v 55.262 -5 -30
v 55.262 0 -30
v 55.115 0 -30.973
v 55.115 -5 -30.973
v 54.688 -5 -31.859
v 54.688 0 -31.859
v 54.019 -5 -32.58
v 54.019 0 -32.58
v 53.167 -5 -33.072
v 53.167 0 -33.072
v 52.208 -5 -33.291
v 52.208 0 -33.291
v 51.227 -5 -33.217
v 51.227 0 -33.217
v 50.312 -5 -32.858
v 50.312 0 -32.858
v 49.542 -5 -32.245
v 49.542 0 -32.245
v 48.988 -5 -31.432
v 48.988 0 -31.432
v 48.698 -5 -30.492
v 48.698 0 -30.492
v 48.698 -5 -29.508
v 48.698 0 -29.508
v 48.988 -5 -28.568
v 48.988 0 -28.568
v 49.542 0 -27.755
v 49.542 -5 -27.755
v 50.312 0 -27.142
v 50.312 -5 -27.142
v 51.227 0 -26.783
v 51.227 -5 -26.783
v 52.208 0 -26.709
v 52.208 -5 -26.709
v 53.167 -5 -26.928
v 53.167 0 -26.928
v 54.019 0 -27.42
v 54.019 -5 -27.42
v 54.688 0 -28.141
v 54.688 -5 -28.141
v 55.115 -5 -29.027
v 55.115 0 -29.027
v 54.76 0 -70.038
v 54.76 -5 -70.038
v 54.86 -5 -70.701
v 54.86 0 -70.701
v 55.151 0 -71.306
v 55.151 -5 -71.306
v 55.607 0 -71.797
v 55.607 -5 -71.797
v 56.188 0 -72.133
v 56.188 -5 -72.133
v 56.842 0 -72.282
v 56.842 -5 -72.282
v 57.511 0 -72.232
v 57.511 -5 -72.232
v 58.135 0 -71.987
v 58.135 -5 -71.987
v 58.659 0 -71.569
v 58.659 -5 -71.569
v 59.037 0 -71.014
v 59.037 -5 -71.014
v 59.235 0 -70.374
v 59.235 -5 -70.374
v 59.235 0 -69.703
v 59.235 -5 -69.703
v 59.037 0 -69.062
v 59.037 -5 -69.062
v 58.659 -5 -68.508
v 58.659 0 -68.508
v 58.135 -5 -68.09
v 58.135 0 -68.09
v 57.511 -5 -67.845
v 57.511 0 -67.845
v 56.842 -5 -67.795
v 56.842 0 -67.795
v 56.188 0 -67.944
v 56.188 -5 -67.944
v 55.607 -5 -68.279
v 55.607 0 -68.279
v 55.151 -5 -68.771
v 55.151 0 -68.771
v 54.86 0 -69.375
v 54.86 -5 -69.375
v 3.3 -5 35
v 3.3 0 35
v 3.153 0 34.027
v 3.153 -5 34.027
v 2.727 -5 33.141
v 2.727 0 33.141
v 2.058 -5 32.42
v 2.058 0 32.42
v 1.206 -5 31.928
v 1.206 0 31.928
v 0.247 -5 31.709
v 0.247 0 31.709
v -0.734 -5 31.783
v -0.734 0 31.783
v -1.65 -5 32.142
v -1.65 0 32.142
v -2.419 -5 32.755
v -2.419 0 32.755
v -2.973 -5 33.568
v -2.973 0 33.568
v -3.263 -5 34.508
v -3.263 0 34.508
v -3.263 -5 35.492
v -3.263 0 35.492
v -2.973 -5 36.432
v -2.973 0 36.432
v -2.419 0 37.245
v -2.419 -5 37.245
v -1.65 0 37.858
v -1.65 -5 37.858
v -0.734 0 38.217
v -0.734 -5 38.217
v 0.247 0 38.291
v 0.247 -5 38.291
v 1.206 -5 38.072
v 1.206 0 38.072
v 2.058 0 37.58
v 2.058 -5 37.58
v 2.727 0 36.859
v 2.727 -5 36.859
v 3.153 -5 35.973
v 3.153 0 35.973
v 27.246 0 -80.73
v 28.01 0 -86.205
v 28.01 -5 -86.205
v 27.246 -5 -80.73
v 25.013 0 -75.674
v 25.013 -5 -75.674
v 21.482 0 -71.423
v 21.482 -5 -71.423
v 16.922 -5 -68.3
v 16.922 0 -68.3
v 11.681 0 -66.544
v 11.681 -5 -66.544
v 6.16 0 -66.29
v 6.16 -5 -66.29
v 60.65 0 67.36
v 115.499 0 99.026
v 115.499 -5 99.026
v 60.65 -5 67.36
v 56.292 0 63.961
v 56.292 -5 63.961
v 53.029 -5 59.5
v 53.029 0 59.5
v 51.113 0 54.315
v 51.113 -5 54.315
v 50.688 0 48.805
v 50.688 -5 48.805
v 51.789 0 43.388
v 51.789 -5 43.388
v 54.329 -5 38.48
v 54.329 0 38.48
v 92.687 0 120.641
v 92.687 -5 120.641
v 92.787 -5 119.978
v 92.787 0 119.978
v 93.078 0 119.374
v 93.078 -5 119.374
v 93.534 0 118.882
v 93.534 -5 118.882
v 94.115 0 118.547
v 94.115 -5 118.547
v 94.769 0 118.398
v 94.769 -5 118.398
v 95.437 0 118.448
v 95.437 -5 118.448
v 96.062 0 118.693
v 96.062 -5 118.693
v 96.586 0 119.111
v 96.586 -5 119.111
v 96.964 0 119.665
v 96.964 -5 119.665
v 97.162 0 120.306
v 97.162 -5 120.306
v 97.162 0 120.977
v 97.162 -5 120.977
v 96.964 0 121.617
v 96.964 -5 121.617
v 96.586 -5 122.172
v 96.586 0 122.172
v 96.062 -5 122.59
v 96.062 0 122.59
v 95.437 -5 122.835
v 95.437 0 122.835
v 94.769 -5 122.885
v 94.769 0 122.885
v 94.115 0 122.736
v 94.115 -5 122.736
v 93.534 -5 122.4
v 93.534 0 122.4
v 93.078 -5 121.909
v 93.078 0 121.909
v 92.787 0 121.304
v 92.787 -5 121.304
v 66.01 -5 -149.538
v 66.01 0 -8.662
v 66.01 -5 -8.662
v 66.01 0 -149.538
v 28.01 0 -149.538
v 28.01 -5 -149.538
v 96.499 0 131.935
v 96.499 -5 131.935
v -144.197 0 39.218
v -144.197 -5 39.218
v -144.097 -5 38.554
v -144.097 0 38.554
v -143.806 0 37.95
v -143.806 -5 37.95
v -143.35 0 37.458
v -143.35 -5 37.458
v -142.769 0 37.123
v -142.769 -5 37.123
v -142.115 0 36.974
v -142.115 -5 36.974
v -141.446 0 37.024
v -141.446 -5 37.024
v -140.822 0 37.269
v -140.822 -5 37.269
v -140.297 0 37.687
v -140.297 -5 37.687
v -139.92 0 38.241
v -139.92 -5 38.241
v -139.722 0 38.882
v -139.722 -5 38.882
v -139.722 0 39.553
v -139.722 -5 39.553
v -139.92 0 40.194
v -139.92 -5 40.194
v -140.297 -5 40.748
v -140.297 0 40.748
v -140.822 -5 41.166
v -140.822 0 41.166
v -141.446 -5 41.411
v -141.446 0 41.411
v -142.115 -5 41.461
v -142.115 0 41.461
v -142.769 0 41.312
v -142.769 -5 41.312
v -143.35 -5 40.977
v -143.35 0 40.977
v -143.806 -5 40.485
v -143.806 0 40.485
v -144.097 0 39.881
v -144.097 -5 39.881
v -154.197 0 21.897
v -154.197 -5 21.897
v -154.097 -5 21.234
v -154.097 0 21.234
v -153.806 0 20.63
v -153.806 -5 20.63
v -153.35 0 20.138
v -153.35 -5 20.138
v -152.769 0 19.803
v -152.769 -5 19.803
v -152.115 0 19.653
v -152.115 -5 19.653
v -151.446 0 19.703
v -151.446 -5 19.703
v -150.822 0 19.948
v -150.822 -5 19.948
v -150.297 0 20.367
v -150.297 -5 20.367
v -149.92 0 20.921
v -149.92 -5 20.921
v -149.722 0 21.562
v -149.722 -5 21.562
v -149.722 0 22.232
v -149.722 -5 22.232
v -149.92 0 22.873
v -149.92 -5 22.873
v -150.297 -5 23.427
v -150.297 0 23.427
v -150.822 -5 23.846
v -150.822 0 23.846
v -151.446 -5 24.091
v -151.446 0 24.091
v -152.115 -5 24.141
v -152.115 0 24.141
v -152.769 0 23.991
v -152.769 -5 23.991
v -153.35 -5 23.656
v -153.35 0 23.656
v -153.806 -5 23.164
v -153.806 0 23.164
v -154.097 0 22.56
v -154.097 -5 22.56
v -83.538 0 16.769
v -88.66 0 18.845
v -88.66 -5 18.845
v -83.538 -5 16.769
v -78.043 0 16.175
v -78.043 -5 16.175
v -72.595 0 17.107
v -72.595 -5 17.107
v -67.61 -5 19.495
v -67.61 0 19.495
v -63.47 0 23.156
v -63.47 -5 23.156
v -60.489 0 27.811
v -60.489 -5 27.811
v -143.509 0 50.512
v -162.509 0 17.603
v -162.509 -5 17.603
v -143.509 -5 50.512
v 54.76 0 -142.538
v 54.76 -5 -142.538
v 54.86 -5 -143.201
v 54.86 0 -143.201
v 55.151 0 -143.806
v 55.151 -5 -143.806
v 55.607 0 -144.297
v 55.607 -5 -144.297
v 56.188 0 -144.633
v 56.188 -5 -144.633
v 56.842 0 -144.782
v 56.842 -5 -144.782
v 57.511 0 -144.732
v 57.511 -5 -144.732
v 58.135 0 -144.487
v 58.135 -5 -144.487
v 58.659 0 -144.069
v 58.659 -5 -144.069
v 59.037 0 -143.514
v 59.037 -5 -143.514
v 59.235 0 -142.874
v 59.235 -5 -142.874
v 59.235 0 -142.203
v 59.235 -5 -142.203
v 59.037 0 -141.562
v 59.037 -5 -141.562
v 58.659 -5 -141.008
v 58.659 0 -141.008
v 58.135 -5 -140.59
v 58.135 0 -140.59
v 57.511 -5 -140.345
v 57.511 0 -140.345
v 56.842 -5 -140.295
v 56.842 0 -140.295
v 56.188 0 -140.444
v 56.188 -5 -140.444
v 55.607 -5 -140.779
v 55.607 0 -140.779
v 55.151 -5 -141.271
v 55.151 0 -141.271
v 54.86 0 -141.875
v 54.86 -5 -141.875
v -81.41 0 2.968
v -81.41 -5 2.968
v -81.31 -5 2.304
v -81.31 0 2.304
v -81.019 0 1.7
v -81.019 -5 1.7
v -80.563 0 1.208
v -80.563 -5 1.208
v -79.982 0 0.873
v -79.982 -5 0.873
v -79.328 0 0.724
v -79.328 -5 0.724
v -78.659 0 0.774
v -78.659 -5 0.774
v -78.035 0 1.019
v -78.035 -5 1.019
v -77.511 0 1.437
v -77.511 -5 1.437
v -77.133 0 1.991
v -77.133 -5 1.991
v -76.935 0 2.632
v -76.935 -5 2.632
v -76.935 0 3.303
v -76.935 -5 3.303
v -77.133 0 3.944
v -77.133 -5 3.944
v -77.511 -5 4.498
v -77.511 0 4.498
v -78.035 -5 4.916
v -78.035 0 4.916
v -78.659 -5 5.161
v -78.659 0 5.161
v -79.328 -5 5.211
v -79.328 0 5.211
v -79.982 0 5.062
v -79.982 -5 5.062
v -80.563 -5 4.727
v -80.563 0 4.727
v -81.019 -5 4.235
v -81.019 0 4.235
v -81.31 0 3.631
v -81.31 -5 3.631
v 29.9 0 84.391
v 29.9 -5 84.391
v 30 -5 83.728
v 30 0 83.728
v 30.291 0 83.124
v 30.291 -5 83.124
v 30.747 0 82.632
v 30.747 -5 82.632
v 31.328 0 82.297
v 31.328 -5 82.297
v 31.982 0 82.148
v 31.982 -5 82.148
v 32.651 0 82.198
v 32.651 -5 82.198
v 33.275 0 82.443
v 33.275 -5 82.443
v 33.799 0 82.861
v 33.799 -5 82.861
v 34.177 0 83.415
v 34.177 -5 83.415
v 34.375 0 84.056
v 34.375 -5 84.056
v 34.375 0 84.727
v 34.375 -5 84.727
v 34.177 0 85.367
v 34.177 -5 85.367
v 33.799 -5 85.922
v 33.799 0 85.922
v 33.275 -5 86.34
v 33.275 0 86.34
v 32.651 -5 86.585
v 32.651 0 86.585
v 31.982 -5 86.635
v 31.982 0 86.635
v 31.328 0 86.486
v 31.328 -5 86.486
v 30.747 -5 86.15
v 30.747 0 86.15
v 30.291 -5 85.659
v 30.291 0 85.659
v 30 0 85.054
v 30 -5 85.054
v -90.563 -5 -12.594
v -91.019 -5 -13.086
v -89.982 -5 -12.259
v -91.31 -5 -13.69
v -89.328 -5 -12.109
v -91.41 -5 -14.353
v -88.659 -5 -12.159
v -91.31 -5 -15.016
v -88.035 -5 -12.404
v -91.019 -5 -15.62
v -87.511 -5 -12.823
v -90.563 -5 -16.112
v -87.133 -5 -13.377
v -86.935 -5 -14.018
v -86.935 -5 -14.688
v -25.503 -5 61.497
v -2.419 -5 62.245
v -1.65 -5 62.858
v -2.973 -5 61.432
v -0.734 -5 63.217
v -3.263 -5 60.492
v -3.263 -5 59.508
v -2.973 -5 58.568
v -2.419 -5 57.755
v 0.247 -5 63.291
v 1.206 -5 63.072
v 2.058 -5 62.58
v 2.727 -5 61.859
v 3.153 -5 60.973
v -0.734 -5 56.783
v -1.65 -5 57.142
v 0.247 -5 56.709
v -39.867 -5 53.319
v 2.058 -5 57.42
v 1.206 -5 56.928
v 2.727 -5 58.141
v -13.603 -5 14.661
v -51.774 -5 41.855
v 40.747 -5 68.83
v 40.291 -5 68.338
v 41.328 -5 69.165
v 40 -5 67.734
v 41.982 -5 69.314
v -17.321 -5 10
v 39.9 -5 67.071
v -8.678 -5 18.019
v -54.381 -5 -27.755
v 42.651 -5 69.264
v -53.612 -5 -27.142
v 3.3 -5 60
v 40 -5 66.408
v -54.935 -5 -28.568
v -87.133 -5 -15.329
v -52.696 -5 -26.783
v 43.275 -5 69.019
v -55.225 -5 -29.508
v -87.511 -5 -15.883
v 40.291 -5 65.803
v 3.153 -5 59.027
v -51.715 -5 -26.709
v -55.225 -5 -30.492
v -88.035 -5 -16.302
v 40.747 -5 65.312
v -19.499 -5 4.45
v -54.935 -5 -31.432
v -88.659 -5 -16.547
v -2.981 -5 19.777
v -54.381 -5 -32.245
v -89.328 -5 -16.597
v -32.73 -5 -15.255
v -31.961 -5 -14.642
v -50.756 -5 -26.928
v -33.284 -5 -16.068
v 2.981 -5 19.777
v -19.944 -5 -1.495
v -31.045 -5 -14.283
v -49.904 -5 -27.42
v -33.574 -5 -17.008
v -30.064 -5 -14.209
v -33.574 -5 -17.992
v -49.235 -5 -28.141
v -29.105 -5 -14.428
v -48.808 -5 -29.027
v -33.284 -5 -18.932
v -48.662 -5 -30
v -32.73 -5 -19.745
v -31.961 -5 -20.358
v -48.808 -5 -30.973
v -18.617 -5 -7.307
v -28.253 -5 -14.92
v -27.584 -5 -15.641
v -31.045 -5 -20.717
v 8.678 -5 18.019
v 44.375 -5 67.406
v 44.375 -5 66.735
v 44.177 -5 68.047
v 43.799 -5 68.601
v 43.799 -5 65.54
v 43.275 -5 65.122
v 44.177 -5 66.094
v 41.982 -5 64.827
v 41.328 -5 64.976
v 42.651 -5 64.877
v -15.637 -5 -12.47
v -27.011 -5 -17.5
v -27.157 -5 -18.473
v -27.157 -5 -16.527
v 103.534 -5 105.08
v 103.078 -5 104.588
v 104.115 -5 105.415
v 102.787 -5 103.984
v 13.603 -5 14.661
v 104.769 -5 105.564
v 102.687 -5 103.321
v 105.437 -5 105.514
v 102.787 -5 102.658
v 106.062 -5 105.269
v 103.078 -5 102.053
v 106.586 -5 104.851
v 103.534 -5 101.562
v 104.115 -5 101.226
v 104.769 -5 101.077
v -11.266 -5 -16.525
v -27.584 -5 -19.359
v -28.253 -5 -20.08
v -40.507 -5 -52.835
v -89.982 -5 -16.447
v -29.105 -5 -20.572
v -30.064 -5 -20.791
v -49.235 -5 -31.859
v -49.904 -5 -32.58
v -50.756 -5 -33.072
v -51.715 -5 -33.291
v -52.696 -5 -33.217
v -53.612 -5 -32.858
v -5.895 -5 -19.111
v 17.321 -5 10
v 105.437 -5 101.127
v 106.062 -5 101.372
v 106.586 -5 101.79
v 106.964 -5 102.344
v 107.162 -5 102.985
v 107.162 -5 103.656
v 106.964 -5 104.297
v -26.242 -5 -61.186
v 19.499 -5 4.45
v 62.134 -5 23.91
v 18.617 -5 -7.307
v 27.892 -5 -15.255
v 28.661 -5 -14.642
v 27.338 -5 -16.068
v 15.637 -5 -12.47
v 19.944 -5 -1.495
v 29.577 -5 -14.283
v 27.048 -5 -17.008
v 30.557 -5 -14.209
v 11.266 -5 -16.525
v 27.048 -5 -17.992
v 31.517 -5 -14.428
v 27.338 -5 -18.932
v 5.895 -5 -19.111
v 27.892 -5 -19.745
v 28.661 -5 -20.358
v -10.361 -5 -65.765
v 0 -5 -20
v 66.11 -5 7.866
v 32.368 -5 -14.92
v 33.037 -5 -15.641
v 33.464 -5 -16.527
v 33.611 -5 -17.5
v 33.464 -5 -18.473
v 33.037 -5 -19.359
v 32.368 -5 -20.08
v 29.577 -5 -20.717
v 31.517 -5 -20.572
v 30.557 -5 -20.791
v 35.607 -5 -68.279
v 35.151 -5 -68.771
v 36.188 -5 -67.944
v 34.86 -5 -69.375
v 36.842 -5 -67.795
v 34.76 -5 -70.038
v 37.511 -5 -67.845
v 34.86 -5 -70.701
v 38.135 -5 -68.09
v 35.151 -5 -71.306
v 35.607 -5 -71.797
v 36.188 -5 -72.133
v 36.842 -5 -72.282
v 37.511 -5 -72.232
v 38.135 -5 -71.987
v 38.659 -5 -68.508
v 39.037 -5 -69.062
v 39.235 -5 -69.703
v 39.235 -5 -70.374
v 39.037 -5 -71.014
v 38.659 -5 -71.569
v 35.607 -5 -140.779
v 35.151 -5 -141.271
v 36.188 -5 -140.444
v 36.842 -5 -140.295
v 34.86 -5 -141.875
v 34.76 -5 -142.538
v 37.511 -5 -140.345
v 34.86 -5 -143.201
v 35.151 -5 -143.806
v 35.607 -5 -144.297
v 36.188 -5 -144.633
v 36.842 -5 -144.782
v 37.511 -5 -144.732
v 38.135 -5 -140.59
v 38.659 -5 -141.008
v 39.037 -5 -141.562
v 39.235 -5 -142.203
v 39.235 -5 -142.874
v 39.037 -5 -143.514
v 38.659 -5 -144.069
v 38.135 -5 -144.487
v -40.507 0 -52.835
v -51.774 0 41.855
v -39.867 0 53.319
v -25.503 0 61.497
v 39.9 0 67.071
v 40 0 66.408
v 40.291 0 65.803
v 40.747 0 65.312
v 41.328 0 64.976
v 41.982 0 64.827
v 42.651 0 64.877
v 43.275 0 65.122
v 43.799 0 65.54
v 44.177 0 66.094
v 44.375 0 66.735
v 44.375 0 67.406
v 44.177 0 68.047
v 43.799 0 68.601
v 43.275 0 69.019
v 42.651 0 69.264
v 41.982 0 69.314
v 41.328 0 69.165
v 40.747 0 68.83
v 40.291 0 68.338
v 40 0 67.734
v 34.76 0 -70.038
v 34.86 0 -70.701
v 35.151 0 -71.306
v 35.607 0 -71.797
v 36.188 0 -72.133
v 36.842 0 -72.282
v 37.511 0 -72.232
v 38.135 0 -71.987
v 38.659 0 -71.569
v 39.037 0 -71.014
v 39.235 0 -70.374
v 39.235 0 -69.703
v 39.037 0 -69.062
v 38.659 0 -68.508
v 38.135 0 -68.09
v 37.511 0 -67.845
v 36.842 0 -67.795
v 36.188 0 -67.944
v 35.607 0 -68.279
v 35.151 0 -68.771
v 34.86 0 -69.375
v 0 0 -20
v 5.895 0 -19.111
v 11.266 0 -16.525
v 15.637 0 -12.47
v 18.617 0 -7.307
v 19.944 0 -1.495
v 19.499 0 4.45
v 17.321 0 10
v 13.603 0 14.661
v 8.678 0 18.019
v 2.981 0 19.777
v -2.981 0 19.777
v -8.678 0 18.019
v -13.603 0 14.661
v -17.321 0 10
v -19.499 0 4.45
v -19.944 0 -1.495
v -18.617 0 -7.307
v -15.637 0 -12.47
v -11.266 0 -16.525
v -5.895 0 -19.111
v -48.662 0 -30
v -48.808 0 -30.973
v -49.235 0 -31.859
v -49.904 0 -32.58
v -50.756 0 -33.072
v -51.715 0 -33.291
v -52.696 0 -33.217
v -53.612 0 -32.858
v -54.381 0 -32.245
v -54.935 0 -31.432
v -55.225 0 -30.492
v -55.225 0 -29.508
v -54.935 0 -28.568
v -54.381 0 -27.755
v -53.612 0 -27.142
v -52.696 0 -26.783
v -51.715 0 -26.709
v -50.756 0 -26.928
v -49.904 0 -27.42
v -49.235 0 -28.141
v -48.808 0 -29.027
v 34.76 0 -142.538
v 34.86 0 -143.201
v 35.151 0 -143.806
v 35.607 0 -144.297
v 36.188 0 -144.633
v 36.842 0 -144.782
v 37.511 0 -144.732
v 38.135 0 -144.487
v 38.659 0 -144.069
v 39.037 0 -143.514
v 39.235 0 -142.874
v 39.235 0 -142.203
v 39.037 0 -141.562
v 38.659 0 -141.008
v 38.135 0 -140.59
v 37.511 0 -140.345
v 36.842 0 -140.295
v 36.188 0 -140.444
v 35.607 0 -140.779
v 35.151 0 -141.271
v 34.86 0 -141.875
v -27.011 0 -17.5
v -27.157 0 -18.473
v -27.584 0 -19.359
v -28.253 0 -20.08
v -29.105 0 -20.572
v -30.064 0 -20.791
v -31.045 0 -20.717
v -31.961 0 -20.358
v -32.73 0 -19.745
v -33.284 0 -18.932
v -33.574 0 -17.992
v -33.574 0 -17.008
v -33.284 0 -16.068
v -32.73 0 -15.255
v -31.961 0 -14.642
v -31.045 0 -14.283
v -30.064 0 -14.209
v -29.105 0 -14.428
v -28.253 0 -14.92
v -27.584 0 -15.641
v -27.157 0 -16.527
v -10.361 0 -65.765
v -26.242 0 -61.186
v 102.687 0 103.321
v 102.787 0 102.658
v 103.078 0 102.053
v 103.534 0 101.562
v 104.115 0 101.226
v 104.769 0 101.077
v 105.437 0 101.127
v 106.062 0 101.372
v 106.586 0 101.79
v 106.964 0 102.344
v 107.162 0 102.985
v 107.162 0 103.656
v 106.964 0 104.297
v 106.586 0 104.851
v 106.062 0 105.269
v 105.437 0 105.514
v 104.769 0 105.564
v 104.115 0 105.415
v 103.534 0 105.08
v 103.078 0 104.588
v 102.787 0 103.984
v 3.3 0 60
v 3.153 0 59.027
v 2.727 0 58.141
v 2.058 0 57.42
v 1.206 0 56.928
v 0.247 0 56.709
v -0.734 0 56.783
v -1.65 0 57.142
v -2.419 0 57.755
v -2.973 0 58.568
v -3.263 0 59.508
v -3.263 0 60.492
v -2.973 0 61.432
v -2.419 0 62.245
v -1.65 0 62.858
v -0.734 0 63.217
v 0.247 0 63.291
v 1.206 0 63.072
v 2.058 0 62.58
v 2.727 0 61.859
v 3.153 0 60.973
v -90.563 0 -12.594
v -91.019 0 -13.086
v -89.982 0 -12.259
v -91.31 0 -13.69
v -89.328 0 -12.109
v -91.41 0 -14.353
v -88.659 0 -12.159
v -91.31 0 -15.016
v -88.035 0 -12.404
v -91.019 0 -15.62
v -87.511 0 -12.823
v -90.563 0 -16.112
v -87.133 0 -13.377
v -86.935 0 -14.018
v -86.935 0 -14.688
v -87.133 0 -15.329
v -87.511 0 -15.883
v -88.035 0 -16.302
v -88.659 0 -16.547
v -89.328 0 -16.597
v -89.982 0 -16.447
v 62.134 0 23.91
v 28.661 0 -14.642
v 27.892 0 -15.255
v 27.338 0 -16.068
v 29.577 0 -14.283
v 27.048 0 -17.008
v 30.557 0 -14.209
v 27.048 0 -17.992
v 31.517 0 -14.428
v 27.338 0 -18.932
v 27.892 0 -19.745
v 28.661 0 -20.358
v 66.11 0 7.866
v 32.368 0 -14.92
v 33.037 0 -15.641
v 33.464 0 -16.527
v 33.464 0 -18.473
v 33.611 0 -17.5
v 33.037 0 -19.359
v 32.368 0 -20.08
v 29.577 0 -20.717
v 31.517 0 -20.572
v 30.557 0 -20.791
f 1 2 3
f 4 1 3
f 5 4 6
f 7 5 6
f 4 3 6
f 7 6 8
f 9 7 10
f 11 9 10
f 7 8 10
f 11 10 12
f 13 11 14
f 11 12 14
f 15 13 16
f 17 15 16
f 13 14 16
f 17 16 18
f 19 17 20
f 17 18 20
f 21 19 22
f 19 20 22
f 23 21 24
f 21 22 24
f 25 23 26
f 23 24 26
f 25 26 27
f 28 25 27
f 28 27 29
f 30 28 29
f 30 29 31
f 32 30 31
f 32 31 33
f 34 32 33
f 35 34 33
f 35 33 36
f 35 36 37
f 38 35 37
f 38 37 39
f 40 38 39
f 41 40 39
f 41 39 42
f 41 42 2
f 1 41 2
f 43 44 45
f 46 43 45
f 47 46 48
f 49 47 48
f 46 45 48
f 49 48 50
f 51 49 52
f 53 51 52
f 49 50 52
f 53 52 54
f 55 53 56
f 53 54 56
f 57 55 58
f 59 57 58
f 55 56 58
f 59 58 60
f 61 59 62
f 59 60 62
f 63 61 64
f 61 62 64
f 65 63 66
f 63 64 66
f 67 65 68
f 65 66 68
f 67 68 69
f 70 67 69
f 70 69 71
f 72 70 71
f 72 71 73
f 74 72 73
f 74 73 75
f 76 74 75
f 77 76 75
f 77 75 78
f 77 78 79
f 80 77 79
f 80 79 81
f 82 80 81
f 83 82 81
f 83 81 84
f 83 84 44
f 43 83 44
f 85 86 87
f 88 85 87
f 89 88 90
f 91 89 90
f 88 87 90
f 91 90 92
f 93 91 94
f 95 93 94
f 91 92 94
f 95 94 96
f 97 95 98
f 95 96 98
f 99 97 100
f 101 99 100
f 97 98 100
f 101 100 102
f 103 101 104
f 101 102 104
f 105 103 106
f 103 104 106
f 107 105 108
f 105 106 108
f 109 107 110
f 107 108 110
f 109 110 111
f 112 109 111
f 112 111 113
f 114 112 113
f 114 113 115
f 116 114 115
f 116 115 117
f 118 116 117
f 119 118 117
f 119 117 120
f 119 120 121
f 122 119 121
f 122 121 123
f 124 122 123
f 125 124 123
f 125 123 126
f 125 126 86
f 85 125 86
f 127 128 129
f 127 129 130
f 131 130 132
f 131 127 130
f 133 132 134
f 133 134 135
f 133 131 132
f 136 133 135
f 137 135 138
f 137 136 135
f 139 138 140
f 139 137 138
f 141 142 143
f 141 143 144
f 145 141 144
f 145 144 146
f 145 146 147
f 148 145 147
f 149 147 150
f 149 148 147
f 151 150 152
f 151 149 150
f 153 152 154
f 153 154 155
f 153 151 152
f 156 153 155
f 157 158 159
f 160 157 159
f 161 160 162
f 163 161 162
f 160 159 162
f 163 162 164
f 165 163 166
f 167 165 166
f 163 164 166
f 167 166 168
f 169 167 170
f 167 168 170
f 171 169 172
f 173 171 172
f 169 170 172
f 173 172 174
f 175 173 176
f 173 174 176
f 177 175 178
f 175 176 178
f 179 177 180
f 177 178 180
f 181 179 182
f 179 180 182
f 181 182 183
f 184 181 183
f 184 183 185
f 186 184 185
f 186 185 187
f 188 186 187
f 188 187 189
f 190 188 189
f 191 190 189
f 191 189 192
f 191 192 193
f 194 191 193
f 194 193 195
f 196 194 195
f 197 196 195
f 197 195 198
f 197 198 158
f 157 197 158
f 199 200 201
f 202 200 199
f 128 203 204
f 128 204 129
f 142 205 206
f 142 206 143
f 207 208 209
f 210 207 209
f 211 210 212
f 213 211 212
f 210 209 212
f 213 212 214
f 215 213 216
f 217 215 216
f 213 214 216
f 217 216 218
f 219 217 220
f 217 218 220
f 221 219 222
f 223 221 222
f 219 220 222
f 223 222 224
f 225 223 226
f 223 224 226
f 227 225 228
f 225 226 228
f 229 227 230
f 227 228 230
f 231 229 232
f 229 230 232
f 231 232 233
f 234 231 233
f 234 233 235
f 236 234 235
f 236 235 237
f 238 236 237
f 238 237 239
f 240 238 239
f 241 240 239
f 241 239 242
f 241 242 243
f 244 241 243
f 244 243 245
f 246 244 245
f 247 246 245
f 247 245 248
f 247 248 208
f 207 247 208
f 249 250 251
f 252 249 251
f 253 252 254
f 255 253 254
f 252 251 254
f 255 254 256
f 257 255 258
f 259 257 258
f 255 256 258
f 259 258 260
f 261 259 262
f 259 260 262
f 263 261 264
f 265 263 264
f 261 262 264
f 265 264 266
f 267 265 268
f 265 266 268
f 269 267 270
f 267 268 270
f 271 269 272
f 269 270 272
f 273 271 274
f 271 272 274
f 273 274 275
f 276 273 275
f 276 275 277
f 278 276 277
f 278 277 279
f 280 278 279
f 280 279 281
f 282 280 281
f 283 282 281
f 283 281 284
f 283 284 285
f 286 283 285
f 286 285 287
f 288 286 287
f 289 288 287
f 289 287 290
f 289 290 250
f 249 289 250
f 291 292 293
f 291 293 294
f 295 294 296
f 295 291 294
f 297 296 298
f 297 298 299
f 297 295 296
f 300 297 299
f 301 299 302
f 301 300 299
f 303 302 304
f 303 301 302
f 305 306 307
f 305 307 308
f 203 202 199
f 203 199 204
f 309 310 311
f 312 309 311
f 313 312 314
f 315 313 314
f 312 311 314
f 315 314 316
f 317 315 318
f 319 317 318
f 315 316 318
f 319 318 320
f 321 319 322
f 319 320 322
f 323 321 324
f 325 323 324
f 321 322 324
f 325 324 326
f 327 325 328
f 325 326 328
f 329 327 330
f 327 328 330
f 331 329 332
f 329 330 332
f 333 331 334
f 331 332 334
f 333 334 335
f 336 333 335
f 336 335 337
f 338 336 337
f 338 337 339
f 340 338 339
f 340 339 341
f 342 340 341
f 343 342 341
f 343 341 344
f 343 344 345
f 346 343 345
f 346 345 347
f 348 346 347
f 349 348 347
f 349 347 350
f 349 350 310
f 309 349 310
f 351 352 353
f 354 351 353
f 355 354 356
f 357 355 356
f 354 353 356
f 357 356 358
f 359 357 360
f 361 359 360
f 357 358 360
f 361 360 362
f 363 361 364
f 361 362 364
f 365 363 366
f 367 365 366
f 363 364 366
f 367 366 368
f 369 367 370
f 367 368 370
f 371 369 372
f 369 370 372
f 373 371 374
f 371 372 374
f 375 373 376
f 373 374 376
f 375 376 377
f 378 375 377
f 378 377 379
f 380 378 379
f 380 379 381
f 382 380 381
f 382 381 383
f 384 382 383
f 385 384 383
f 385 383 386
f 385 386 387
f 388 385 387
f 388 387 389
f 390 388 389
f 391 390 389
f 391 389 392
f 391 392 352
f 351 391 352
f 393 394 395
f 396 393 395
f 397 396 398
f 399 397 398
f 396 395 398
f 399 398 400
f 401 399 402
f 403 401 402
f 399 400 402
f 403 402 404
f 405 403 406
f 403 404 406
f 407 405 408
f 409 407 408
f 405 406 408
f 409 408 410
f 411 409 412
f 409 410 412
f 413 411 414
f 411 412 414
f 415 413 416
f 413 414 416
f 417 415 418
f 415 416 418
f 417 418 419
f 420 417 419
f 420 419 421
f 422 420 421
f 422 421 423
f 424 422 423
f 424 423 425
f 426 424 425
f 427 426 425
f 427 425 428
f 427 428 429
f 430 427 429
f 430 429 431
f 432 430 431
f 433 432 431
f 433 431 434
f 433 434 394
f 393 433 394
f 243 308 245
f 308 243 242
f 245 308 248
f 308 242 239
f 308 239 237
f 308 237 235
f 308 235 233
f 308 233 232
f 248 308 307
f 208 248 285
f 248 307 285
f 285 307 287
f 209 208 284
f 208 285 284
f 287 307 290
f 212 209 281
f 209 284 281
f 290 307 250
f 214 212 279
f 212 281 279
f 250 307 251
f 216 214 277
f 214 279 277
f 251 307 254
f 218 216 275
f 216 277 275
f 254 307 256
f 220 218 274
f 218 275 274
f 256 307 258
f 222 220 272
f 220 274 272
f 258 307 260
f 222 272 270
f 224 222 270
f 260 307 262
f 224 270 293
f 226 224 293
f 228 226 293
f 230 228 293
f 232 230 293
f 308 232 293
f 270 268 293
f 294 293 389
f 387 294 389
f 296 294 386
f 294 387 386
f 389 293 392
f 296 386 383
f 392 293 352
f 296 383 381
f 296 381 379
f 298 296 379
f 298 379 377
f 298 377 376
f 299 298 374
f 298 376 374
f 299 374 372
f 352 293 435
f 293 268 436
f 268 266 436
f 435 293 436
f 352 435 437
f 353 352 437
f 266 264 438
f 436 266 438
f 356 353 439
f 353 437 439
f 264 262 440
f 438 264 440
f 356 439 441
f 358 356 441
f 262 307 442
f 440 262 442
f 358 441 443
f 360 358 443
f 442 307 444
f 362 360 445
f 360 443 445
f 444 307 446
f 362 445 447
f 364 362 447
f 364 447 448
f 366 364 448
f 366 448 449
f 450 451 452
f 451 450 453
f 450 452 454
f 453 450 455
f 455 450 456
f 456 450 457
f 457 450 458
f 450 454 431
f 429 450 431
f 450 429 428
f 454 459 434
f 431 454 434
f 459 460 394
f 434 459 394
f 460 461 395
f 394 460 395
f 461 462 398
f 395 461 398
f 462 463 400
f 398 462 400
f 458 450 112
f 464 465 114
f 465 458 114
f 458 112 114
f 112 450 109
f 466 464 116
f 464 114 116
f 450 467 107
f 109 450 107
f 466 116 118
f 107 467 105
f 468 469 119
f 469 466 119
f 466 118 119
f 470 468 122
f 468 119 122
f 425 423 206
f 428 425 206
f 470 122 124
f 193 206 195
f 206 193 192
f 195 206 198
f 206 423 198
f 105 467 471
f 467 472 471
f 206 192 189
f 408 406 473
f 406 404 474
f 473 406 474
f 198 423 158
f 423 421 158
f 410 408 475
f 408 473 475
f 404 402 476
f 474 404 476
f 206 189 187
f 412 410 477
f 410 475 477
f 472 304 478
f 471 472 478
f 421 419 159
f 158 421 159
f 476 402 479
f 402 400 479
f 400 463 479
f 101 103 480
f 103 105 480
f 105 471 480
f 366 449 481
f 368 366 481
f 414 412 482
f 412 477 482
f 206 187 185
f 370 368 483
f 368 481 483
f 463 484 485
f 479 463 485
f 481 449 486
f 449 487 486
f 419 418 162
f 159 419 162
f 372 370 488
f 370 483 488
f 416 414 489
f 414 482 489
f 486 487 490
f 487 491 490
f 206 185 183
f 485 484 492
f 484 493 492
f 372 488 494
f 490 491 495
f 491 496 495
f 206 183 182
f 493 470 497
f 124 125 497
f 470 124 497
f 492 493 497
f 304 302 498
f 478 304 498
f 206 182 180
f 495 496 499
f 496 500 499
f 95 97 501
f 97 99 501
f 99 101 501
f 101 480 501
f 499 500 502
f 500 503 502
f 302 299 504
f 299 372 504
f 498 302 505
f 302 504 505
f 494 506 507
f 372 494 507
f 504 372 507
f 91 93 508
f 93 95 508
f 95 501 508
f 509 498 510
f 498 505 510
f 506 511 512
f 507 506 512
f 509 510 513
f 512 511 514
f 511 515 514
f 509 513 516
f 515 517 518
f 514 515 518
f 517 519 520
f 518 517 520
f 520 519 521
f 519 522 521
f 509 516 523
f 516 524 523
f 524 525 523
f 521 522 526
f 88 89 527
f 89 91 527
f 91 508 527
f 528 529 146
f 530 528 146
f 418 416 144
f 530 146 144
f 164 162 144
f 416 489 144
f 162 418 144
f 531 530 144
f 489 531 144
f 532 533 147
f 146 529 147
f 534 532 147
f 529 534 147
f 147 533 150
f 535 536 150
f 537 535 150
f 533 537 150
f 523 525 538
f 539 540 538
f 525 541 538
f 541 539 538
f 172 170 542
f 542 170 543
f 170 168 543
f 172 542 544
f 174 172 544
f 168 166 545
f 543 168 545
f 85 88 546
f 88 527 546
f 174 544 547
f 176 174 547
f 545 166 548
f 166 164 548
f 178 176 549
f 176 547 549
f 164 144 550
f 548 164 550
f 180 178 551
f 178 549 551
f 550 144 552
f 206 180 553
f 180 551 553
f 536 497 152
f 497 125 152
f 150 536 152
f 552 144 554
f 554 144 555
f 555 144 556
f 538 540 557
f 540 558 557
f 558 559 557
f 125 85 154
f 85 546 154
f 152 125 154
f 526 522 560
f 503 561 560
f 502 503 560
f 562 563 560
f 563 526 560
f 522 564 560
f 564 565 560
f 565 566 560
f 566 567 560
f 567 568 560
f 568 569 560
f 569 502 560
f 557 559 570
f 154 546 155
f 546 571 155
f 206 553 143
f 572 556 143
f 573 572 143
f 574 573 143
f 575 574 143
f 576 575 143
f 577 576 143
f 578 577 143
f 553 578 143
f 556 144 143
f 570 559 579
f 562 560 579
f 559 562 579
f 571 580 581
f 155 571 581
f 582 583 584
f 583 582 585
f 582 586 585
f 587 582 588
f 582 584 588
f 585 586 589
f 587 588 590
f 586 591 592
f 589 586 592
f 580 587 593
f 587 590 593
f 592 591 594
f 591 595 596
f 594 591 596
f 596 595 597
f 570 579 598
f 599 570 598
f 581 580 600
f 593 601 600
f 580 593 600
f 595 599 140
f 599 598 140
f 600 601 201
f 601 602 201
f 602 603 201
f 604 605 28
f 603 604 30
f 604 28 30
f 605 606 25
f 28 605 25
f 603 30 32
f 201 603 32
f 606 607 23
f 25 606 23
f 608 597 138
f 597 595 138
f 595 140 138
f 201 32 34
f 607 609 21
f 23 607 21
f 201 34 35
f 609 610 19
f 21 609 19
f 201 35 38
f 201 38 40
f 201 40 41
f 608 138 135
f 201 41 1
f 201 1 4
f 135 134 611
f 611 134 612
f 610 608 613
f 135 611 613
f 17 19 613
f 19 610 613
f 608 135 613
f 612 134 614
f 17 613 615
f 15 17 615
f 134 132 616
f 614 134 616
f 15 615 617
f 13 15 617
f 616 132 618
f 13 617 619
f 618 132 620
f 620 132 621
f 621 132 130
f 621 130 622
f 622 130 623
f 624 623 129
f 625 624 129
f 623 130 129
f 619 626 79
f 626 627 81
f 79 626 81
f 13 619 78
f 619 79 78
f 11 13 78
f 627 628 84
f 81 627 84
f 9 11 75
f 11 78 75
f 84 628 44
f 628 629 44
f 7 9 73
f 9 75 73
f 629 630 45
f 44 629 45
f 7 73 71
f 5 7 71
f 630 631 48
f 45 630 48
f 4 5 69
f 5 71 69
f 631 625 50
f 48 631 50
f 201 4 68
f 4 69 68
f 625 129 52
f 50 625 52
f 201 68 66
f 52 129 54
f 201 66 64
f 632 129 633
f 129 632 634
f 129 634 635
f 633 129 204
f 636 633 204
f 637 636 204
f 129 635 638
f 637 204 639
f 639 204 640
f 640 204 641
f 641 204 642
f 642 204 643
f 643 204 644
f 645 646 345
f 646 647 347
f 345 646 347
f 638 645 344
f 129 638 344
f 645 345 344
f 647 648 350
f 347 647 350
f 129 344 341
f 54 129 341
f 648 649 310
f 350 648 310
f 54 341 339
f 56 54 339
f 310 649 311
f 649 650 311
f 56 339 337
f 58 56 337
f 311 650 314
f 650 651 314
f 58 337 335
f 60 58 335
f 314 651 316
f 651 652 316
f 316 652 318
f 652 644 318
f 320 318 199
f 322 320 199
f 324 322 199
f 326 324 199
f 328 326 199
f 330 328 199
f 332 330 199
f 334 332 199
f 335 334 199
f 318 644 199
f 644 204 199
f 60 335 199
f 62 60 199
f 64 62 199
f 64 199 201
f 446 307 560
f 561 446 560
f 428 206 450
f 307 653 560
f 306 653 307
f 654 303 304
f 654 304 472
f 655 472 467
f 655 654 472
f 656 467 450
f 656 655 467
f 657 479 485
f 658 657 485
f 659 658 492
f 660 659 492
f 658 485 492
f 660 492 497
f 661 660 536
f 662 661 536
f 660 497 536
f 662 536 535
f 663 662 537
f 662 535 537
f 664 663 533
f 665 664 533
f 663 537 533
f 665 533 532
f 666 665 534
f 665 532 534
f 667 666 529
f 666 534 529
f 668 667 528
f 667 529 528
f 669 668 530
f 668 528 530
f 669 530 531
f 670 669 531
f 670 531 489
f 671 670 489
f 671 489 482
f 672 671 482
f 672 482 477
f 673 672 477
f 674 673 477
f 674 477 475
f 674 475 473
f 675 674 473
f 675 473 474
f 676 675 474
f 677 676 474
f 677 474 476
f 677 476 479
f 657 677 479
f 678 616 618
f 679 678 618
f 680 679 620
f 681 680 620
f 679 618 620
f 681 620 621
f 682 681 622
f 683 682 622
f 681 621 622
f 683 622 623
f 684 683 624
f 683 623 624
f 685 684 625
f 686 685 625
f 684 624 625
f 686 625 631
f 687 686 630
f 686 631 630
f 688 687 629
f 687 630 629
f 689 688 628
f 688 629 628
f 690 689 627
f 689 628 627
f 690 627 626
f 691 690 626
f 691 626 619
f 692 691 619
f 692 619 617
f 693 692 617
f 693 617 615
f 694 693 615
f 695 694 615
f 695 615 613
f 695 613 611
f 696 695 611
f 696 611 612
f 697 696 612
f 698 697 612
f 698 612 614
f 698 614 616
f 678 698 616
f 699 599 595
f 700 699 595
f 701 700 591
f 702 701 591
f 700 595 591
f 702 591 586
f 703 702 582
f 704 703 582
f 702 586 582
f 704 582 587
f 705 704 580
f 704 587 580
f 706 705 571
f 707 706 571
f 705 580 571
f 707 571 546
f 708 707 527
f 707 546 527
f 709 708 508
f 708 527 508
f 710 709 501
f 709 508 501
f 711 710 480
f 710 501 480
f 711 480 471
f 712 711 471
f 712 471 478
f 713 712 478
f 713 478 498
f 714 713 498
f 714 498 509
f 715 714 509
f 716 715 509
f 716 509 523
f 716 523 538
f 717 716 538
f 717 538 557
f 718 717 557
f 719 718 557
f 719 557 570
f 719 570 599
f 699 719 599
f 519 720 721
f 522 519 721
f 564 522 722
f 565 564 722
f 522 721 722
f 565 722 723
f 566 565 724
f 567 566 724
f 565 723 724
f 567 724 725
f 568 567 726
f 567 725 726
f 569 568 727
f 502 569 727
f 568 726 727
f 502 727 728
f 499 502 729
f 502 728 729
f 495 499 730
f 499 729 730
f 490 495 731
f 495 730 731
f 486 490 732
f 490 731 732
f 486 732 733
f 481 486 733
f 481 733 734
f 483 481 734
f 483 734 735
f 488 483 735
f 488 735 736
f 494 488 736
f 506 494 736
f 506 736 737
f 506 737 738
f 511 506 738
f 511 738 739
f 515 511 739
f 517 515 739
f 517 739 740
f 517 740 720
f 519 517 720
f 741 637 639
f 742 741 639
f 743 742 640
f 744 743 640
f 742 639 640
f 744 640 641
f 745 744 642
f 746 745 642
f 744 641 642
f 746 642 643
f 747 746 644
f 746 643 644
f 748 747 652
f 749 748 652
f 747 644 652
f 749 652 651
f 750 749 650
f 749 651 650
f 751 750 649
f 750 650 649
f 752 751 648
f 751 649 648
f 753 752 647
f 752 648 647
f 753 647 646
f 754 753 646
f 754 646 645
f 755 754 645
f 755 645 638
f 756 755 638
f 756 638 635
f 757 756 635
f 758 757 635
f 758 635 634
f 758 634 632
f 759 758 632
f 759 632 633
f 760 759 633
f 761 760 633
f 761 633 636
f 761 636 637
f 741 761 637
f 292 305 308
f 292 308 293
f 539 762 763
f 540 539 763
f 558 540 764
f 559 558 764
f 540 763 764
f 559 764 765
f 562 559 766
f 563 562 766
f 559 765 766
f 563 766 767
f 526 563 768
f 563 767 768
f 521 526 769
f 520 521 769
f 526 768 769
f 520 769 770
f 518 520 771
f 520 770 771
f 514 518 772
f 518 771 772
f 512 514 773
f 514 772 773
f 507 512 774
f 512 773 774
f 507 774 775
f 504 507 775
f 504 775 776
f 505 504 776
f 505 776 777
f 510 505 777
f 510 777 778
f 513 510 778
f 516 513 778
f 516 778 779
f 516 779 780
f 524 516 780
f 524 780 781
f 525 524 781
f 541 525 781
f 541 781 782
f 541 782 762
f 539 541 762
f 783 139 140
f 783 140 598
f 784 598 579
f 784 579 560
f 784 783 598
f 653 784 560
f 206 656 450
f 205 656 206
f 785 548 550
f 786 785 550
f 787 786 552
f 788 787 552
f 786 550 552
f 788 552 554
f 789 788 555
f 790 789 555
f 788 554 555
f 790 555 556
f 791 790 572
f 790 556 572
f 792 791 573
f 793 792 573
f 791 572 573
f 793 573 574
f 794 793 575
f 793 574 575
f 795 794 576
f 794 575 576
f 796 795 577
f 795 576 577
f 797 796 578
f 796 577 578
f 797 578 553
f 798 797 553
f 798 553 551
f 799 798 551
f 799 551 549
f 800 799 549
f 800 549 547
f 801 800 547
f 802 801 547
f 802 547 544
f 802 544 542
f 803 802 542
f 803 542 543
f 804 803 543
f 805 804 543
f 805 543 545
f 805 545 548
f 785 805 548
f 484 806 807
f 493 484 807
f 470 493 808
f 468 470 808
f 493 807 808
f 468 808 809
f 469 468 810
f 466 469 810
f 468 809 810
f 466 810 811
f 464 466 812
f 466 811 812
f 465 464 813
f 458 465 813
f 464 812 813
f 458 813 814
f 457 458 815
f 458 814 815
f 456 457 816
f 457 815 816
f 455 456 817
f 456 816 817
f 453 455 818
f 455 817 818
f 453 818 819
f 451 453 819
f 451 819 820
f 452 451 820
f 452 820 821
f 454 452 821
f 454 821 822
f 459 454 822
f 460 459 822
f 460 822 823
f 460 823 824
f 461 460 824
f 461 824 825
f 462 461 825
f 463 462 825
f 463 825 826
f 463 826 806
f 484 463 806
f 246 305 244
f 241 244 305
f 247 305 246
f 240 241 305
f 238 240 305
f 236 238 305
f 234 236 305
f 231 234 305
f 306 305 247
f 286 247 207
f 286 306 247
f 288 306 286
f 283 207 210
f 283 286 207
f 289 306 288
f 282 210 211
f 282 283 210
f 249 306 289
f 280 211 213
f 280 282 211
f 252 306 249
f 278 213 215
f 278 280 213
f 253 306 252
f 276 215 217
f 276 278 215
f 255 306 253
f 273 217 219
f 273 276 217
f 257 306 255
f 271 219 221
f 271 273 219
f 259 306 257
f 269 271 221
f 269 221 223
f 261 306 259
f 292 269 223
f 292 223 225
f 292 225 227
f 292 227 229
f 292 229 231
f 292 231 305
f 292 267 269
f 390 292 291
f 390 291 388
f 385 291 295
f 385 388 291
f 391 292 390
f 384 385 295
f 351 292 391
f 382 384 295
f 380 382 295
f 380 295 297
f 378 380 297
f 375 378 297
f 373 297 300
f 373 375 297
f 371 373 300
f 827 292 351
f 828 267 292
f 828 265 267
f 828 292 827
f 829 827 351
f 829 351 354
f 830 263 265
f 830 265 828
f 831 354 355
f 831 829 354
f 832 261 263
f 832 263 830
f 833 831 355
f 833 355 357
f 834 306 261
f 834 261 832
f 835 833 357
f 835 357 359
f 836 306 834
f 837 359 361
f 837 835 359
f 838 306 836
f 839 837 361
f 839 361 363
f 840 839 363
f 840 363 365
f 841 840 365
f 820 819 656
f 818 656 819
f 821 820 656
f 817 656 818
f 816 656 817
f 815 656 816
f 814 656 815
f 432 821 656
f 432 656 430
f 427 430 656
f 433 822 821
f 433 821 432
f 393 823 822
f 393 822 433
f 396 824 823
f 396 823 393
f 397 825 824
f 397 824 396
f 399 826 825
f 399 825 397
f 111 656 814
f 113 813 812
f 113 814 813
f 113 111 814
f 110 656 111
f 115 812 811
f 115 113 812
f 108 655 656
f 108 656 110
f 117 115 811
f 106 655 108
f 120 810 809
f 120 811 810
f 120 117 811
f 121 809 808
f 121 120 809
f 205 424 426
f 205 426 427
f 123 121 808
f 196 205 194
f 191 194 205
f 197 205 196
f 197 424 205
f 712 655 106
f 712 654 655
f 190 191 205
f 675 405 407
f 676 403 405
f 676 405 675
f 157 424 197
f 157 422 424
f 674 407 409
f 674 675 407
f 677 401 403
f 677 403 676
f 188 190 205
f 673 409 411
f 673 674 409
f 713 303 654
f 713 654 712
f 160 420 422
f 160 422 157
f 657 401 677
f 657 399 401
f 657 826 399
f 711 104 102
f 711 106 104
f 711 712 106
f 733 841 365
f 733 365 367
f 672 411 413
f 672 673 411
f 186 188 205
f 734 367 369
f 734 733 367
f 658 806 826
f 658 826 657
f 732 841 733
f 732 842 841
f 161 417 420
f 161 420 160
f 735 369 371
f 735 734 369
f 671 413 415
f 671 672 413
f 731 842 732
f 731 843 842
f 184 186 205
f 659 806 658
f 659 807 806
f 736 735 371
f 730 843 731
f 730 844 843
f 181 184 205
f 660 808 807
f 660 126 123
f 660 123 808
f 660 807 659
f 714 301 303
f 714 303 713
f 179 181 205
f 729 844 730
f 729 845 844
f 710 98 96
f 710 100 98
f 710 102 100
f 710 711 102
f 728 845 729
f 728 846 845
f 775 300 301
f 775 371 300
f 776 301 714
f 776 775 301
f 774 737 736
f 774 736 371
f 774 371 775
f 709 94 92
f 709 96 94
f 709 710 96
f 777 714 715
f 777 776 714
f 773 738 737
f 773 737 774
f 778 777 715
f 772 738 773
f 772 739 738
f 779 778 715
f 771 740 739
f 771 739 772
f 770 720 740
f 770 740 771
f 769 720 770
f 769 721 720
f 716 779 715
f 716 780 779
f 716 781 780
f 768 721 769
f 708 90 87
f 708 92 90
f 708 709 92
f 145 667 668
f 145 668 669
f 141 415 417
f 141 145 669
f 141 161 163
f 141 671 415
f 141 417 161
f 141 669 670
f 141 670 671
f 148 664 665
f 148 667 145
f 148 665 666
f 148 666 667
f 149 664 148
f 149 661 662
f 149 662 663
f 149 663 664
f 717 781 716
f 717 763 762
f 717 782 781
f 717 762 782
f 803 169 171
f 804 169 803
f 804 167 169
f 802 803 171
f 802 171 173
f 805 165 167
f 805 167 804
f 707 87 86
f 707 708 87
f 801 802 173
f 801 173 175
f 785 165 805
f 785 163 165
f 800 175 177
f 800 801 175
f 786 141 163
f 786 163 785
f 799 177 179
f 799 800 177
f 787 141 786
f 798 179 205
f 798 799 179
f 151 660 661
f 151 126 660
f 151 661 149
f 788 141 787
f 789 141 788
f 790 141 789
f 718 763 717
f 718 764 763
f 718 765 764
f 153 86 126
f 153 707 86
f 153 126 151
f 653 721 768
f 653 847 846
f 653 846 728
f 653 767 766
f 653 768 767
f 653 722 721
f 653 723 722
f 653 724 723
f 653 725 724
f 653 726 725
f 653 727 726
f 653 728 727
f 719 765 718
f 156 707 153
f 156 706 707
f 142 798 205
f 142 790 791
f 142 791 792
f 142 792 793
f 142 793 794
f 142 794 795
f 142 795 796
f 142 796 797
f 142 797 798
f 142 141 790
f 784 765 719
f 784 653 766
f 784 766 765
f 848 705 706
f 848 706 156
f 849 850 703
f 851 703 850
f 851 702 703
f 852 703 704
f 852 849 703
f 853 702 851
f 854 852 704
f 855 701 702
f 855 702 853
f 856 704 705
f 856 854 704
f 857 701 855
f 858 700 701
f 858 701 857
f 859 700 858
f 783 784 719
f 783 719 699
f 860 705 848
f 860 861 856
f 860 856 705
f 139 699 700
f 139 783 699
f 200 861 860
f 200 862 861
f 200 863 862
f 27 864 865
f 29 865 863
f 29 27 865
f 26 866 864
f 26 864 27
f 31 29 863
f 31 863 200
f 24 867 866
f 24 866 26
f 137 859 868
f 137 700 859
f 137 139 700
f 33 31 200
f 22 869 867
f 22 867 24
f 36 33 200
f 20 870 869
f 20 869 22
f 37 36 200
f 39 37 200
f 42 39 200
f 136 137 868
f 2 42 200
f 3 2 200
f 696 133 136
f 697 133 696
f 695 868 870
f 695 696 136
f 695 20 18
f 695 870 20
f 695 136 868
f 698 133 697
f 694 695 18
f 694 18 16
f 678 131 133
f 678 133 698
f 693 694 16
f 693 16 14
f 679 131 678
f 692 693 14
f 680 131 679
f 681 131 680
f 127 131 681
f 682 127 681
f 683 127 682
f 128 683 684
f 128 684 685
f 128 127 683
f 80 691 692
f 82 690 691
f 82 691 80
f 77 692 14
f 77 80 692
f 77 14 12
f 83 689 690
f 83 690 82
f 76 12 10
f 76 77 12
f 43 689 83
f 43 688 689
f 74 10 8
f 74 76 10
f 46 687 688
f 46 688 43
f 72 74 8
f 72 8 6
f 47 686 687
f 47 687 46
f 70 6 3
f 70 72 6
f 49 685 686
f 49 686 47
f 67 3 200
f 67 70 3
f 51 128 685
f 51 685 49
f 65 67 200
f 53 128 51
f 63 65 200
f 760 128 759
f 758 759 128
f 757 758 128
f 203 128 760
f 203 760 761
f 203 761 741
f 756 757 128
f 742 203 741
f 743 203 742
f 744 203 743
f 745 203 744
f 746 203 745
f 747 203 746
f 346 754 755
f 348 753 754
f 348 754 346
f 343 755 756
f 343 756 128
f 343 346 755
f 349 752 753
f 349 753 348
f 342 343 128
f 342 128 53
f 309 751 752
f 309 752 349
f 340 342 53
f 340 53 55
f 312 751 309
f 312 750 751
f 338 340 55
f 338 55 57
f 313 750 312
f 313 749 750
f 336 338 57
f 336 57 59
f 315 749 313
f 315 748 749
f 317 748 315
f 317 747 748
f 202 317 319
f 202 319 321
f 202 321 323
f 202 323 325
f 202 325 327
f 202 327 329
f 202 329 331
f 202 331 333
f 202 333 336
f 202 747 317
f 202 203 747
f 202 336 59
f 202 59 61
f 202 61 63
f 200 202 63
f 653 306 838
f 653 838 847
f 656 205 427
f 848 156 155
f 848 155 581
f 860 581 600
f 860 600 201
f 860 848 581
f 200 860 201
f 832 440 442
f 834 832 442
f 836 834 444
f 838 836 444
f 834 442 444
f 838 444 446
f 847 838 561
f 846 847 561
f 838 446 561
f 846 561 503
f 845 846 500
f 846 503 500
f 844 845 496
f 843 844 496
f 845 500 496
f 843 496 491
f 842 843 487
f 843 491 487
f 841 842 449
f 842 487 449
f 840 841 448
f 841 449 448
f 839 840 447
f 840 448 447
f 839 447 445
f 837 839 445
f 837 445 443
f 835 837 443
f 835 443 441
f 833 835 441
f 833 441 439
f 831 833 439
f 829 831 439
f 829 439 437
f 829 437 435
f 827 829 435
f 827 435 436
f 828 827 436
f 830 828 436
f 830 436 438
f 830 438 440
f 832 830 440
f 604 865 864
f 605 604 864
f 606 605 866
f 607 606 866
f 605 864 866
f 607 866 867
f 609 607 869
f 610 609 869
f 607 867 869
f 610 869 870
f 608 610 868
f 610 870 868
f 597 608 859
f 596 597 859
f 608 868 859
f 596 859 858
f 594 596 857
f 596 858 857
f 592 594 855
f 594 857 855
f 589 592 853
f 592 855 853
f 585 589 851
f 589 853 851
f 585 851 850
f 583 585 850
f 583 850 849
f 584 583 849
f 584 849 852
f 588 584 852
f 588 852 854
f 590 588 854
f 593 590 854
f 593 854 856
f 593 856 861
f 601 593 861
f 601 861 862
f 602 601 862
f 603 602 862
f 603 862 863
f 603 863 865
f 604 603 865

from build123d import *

# Parameters (mm, degrees)
EXTRUDE_1_DEPTH        = 5
SKETCH_3_R             = 20
CUT_EXTRUDE_1_DEPTH    = 221.897762361
HOLE_WIZARD_M6_1_D     = 6.6
HOLE_WIZARD_M4_2_D     = 4.5
HOLE_WIZARD_M4_2_DEPTH = 10
HOLE_WIZARD_M4_2_TIP   = 1.351936393


with BuildPart() as part:
    # 스케치2 → 보스-돌출1 (new body)
    with BuildSketch(Plane(origin=(0, 0, 0), x_dir=(1, 0, 0), z_dir=(0, 1, 0))):
        with BuildLine():
            Line((66.01, 8.662039246), (66.01, 149.538220784))
            Line((66.01, 149.538220784), (28.01, 149.538220784))
            Line((28.01, 149.538220784), (28.01, 86.204565384))
            ThreePointArc((28.01, 86.204565384), (21.482045359, 71.422684791), (6.159600614, 66.290348801))
            ThreePointArc((6.159600614, 66.290348801), (-18.444176134, 63.970019467), (-40.506546036, 52.835317281))
            Line((-40.506546036, 52.835317281), (-162.508898036, -17.602773488))
            Line((-162.508898036, -17.602773488), (-143.508898036, -50.511738832))
            Line((-143.508898036, -50.511738832), (-88.660343545, -18.844911132))
            ThreePointArc((-88.660343545, -18.844911132), (-72.594882115, -17.10734539), (-60.488926395, -27.810803791))
            ThreePointArc((-60.488926395, -27.810803791), (-46.177573873, -47.958134817), (-25.503453964, -61.497356527))
            Line((-25.503453964, -61.497356527), (96.498898036, -131.935447296))
            Line((96.498898036, -131.935447296), (115.498898036, -99.026481952))
            Line((115.498898036, -99.026481952), (60.650343545, -67.359654252))
            ThreePointArc((60.650343545, -67.359654252), (51.112836757, -54.315339401), (54.32932578, -38.47954501))
            ThreePointArc((54.32932578, -38.47954501), (64.621750006, -16.01188465), (66.01, 8.662039246))
        make_face()
    extrude(amount=-EXTRUDE_1_DEPTH)

    # 스케치3 → 컷-돌출1 (cut, through all)
    with BuildSketch(Plane(origin=(0, -5, 0), x_dir=(-1, 0, 0), z_dir=(0, -1, 0))):
        with Locations(Location((0, 0, 0), (0, 0, 90))):
            Circle(SKETCH_3_R)
    extrude(amount=-CUT_EXTRUDE_1_DEPTH, mode=Mode.SUBTRACT)

    # M6 여유 구멍1 (through all)
    with Locations(Plane(origin=(0, -5, 0), x_dir=(-1, 0, 0), z_dir=(0, -1, 0))):
        with Locations((30.310889132, 17.5), (0, -60), (0, -35), (-51.961524227, 30), (-30.310889132, 17.5), (51.961524227, 30)):
            Hole(HOLE_WIZARD_M6_1_D / 2)

    # M4 여유 구멍2
    with Locations(Plane(origin=(0, 0, 0), x_dir=(1, 0, 0), z_dir=(0, 1, 0))):
        with Locations((57.01, 142.538220784), (37.01, 142.538220784), (37.01, 70.038220784), (57.01, 70.038220784), (94.936720209, -120.641218662), (104.936720209, -103.320710586), (42.149878435, -67.070710586), (32.149878435, -84.391218662), (-151.946720209, -21.897002122), (-141.946720209, -39.217510198), (-79.159878435, -2.967510198), (-89.159878435, 14.352997878)):
            Hole(HOLE_WIZARD_M4_2_D / 2, depth=HOLE_WIZARD_M4_2_DEPTH)
            with Locations((0, 0, -(HOLE_WIZARD_M4_2_DEPTH + HOLE_WIZARD_M4_2_TIP / 2))):  # 118° drill point
                Cone(0, HOLE_WIZARD_M4_2_D / 2, HOLE_WIZARD_M4_2_TIP, mode=Mode.SUBTRACT)


solid = part.part
